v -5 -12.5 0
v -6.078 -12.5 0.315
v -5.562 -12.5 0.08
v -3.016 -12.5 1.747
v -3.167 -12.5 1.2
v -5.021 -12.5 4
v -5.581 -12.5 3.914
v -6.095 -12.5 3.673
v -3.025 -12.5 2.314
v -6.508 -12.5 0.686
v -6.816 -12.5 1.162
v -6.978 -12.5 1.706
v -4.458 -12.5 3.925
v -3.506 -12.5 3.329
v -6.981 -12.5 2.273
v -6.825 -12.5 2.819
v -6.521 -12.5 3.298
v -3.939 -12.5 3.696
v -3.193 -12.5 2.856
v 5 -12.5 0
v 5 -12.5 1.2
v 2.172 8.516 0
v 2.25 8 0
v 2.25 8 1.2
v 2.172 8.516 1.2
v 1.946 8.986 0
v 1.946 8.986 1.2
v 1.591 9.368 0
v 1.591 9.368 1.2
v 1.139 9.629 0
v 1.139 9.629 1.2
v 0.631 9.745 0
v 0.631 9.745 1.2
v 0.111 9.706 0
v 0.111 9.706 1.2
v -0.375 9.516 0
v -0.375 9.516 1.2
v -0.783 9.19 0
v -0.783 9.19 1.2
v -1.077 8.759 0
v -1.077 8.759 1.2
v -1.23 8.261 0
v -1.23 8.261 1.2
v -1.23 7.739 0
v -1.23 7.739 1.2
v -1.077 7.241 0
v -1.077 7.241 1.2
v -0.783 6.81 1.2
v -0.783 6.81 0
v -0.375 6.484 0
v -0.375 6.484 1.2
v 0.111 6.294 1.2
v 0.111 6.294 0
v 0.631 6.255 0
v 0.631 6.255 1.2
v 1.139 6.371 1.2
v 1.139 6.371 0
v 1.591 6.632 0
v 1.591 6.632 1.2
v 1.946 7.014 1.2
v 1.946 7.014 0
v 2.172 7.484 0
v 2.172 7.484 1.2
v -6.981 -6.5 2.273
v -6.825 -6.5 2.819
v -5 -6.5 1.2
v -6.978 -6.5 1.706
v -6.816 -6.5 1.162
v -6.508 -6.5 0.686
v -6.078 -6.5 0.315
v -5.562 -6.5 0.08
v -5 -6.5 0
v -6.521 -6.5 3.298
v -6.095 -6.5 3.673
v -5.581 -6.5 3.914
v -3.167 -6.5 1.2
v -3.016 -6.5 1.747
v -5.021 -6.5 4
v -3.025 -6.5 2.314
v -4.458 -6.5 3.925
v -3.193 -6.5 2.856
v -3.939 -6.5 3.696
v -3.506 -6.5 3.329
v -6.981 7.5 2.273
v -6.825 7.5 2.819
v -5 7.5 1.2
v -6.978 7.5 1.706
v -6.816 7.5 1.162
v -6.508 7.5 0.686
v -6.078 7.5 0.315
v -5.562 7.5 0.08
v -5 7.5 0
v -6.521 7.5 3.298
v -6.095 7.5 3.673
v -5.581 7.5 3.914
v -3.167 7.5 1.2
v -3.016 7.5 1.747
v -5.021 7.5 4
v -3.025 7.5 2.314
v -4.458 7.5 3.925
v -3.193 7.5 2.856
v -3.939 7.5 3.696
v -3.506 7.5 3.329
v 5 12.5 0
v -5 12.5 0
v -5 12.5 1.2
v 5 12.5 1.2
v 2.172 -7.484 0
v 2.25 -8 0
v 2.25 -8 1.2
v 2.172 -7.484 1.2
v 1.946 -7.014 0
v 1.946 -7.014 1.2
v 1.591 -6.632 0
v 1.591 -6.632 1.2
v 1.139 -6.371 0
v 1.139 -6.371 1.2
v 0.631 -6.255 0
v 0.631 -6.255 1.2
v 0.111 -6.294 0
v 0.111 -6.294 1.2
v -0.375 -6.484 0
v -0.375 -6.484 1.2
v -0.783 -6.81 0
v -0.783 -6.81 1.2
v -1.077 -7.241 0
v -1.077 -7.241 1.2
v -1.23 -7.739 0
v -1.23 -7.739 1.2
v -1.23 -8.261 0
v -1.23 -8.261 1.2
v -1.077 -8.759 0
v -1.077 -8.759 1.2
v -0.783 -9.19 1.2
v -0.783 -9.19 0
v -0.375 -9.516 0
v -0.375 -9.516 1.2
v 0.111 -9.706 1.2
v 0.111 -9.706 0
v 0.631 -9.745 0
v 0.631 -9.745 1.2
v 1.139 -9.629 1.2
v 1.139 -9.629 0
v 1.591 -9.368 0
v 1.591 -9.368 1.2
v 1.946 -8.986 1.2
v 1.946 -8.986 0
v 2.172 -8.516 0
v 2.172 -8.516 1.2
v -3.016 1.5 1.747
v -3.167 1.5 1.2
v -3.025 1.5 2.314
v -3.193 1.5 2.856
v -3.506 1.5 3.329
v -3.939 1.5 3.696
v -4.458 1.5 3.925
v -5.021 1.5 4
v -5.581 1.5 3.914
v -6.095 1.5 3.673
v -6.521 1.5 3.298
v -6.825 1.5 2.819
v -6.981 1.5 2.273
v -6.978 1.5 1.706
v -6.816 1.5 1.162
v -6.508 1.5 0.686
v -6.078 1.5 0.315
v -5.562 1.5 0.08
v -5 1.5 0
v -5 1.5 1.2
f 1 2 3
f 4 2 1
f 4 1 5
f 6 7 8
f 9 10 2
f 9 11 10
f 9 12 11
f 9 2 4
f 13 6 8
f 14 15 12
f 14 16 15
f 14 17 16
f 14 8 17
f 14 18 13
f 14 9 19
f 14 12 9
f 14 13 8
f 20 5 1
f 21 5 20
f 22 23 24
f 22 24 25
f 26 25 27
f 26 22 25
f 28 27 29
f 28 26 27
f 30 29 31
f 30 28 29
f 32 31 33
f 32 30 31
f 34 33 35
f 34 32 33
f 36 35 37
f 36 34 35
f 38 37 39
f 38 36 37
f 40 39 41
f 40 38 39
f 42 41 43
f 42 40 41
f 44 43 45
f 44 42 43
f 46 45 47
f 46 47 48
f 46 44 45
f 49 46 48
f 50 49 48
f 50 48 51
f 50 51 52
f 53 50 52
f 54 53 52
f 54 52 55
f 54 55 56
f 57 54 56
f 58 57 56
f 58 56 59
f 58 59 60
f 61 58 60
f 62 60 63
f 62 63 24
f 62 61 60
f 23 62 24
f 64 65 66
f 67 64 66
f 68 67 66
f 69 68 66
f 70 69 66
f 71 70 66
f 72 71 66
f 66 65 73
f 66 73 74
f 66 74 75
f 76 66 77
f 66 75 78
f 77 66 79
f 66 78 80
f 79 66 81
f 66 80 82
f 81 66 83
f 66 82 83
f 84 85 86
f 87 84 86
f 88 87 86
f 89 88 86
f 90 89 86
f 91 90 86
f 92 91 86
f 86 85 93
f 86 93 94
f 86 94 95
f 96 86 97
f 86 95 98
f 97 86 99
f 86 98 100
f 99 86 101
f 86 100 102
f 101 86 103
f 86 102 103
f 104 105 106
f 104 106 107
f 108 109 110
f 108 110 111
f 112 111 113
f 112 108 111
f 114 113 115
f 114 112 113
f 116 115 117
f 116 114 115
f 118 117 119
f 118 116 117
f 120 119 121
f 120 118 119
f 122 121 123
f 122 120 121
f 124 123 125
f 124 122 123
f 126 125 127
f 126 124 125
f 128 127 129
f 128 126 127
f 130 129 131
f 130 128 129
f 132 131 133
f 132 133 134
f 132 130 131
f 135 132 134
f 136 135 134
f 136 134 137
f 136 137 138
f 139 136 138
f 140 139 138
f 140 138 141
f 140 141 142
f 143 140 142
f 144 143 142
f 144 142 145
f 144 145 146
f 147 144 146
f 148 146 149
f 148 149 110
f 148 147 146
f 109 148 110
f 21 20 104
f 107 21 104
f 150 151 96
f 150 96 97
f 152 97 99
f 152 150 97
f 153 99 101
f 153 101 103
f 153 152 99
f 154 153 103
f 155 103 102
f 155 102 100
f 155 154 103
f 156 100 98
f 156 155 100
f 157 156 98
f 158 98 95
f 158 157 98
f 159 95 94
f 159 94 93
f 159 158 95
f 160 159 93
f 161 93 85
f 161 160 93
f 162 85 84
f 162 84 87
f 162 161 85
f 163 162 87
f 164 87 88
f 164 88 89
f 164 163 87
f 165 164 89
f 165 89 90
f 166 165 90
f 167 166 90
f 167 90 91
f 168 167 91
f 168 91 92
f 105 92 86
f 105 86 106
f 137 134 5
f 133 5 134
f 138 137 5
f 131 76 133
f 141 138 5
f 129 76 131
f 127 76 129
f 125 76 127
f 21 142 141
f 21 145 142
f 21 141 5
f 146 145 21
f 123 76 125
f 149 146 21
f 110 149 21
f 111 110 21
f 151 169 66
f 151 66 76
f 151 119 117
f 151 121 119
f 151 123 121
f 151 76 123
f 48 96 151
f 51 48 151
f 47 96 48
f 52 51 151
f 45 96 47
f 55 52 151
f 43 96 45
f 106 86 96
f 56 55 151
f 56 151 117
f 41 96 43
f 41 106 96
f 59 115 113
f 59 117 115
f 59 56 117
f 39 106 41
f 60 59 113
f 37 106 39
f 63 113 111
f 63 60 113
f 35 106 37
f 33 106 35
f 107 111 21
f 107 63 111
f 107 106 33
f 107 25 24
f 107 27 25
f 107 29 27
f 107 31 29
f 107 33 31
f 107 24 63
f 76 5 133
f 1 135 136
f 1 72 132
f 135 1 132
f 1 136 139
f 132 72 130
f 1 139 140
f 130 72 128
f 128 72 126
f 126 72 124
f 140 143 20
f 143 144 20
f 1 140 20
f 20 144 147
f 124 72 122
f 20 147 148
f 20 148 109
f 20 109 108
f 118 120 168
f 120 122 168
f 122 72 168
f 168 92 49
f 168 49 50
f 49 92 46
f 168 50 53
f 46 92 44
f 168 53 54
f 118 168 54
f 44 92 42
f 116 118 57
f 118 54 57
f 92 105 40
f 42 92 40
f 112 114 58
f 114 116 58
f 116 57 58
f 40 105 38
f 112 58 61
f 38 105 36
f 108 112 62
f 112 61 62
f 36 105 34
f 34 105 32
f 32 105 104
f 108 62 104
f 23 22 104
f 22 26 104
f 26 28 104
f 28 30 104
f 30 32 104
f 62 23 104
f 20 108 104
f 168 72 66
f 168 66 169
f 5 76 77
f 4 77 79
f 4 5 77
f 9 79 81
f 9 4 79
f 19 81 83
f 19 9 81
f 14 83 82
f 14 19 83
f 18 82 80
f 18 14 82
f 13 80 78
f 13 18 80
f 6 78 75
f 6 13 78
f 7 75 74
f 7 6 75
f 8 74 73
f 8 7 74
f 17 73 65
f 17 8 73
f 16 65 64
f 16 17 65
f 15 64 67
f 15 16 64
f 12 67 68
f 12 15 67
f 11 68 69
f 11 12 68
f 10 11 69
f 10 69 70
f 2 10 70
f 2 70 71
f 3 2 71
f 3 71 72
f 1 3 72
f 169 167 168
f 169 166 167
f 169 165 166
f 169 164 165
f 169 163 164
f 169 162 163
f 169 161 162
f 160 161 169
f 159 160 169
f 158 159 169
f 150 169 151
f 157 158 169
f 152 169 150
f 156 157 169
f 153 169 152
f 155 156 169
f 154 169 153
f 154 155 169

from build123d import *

# Parameters (mm, degrees)
SKETCH_1_W             = 10
SKETCH_1_H             = 25
SKETCH_1_R             = 1.75
EXTRUDE_1_DEPTH        = 1.2
SKETCH_3_R             = 2
EXTRUDE_3_DEPTH        = 6
PATTERN_LINEAR_2_COUNT = 2
PATTERN_LINEAR_2_PITCH = 14


with BuildPart() as part:
    # 草图1 → 凸台-拉伸1 (new body)
    with BuildSketch(Plane.XY):
        Rectangle(SKETCH_1_W, SKETCH_1_H)
        with Locations((0.5, 8)):
            Circle(SKETCH_1_R, mode=Mode.SUBTRACT)
        with Locations((0.5, -8)):
            Circle(SKETCH_1_R, mode=Mode.SUBTRACT)
    extrude(amount=EXTRUDE_1_DEPTH)

    # 草图3 → 凸台-拉伸3 (add)
    with BuildSketch(Plane.XZ.offset(12.5)):
        with Locations((-5, 2)):
            Circle(SKETCH_3_R)
    extrude_3 = extrude(amount=-EXTRUDE_3_DEPTH)

    # 阵列(线性)2: 凸台-拉伸3 ×2
    with Locations(*[(0, i * PATTERN_LINEAR_2_PITCH, 0) for i in range(1, PATTERN_LINEAR_2_COUNT)]):
        add(extrude_3)


solid = part.part
